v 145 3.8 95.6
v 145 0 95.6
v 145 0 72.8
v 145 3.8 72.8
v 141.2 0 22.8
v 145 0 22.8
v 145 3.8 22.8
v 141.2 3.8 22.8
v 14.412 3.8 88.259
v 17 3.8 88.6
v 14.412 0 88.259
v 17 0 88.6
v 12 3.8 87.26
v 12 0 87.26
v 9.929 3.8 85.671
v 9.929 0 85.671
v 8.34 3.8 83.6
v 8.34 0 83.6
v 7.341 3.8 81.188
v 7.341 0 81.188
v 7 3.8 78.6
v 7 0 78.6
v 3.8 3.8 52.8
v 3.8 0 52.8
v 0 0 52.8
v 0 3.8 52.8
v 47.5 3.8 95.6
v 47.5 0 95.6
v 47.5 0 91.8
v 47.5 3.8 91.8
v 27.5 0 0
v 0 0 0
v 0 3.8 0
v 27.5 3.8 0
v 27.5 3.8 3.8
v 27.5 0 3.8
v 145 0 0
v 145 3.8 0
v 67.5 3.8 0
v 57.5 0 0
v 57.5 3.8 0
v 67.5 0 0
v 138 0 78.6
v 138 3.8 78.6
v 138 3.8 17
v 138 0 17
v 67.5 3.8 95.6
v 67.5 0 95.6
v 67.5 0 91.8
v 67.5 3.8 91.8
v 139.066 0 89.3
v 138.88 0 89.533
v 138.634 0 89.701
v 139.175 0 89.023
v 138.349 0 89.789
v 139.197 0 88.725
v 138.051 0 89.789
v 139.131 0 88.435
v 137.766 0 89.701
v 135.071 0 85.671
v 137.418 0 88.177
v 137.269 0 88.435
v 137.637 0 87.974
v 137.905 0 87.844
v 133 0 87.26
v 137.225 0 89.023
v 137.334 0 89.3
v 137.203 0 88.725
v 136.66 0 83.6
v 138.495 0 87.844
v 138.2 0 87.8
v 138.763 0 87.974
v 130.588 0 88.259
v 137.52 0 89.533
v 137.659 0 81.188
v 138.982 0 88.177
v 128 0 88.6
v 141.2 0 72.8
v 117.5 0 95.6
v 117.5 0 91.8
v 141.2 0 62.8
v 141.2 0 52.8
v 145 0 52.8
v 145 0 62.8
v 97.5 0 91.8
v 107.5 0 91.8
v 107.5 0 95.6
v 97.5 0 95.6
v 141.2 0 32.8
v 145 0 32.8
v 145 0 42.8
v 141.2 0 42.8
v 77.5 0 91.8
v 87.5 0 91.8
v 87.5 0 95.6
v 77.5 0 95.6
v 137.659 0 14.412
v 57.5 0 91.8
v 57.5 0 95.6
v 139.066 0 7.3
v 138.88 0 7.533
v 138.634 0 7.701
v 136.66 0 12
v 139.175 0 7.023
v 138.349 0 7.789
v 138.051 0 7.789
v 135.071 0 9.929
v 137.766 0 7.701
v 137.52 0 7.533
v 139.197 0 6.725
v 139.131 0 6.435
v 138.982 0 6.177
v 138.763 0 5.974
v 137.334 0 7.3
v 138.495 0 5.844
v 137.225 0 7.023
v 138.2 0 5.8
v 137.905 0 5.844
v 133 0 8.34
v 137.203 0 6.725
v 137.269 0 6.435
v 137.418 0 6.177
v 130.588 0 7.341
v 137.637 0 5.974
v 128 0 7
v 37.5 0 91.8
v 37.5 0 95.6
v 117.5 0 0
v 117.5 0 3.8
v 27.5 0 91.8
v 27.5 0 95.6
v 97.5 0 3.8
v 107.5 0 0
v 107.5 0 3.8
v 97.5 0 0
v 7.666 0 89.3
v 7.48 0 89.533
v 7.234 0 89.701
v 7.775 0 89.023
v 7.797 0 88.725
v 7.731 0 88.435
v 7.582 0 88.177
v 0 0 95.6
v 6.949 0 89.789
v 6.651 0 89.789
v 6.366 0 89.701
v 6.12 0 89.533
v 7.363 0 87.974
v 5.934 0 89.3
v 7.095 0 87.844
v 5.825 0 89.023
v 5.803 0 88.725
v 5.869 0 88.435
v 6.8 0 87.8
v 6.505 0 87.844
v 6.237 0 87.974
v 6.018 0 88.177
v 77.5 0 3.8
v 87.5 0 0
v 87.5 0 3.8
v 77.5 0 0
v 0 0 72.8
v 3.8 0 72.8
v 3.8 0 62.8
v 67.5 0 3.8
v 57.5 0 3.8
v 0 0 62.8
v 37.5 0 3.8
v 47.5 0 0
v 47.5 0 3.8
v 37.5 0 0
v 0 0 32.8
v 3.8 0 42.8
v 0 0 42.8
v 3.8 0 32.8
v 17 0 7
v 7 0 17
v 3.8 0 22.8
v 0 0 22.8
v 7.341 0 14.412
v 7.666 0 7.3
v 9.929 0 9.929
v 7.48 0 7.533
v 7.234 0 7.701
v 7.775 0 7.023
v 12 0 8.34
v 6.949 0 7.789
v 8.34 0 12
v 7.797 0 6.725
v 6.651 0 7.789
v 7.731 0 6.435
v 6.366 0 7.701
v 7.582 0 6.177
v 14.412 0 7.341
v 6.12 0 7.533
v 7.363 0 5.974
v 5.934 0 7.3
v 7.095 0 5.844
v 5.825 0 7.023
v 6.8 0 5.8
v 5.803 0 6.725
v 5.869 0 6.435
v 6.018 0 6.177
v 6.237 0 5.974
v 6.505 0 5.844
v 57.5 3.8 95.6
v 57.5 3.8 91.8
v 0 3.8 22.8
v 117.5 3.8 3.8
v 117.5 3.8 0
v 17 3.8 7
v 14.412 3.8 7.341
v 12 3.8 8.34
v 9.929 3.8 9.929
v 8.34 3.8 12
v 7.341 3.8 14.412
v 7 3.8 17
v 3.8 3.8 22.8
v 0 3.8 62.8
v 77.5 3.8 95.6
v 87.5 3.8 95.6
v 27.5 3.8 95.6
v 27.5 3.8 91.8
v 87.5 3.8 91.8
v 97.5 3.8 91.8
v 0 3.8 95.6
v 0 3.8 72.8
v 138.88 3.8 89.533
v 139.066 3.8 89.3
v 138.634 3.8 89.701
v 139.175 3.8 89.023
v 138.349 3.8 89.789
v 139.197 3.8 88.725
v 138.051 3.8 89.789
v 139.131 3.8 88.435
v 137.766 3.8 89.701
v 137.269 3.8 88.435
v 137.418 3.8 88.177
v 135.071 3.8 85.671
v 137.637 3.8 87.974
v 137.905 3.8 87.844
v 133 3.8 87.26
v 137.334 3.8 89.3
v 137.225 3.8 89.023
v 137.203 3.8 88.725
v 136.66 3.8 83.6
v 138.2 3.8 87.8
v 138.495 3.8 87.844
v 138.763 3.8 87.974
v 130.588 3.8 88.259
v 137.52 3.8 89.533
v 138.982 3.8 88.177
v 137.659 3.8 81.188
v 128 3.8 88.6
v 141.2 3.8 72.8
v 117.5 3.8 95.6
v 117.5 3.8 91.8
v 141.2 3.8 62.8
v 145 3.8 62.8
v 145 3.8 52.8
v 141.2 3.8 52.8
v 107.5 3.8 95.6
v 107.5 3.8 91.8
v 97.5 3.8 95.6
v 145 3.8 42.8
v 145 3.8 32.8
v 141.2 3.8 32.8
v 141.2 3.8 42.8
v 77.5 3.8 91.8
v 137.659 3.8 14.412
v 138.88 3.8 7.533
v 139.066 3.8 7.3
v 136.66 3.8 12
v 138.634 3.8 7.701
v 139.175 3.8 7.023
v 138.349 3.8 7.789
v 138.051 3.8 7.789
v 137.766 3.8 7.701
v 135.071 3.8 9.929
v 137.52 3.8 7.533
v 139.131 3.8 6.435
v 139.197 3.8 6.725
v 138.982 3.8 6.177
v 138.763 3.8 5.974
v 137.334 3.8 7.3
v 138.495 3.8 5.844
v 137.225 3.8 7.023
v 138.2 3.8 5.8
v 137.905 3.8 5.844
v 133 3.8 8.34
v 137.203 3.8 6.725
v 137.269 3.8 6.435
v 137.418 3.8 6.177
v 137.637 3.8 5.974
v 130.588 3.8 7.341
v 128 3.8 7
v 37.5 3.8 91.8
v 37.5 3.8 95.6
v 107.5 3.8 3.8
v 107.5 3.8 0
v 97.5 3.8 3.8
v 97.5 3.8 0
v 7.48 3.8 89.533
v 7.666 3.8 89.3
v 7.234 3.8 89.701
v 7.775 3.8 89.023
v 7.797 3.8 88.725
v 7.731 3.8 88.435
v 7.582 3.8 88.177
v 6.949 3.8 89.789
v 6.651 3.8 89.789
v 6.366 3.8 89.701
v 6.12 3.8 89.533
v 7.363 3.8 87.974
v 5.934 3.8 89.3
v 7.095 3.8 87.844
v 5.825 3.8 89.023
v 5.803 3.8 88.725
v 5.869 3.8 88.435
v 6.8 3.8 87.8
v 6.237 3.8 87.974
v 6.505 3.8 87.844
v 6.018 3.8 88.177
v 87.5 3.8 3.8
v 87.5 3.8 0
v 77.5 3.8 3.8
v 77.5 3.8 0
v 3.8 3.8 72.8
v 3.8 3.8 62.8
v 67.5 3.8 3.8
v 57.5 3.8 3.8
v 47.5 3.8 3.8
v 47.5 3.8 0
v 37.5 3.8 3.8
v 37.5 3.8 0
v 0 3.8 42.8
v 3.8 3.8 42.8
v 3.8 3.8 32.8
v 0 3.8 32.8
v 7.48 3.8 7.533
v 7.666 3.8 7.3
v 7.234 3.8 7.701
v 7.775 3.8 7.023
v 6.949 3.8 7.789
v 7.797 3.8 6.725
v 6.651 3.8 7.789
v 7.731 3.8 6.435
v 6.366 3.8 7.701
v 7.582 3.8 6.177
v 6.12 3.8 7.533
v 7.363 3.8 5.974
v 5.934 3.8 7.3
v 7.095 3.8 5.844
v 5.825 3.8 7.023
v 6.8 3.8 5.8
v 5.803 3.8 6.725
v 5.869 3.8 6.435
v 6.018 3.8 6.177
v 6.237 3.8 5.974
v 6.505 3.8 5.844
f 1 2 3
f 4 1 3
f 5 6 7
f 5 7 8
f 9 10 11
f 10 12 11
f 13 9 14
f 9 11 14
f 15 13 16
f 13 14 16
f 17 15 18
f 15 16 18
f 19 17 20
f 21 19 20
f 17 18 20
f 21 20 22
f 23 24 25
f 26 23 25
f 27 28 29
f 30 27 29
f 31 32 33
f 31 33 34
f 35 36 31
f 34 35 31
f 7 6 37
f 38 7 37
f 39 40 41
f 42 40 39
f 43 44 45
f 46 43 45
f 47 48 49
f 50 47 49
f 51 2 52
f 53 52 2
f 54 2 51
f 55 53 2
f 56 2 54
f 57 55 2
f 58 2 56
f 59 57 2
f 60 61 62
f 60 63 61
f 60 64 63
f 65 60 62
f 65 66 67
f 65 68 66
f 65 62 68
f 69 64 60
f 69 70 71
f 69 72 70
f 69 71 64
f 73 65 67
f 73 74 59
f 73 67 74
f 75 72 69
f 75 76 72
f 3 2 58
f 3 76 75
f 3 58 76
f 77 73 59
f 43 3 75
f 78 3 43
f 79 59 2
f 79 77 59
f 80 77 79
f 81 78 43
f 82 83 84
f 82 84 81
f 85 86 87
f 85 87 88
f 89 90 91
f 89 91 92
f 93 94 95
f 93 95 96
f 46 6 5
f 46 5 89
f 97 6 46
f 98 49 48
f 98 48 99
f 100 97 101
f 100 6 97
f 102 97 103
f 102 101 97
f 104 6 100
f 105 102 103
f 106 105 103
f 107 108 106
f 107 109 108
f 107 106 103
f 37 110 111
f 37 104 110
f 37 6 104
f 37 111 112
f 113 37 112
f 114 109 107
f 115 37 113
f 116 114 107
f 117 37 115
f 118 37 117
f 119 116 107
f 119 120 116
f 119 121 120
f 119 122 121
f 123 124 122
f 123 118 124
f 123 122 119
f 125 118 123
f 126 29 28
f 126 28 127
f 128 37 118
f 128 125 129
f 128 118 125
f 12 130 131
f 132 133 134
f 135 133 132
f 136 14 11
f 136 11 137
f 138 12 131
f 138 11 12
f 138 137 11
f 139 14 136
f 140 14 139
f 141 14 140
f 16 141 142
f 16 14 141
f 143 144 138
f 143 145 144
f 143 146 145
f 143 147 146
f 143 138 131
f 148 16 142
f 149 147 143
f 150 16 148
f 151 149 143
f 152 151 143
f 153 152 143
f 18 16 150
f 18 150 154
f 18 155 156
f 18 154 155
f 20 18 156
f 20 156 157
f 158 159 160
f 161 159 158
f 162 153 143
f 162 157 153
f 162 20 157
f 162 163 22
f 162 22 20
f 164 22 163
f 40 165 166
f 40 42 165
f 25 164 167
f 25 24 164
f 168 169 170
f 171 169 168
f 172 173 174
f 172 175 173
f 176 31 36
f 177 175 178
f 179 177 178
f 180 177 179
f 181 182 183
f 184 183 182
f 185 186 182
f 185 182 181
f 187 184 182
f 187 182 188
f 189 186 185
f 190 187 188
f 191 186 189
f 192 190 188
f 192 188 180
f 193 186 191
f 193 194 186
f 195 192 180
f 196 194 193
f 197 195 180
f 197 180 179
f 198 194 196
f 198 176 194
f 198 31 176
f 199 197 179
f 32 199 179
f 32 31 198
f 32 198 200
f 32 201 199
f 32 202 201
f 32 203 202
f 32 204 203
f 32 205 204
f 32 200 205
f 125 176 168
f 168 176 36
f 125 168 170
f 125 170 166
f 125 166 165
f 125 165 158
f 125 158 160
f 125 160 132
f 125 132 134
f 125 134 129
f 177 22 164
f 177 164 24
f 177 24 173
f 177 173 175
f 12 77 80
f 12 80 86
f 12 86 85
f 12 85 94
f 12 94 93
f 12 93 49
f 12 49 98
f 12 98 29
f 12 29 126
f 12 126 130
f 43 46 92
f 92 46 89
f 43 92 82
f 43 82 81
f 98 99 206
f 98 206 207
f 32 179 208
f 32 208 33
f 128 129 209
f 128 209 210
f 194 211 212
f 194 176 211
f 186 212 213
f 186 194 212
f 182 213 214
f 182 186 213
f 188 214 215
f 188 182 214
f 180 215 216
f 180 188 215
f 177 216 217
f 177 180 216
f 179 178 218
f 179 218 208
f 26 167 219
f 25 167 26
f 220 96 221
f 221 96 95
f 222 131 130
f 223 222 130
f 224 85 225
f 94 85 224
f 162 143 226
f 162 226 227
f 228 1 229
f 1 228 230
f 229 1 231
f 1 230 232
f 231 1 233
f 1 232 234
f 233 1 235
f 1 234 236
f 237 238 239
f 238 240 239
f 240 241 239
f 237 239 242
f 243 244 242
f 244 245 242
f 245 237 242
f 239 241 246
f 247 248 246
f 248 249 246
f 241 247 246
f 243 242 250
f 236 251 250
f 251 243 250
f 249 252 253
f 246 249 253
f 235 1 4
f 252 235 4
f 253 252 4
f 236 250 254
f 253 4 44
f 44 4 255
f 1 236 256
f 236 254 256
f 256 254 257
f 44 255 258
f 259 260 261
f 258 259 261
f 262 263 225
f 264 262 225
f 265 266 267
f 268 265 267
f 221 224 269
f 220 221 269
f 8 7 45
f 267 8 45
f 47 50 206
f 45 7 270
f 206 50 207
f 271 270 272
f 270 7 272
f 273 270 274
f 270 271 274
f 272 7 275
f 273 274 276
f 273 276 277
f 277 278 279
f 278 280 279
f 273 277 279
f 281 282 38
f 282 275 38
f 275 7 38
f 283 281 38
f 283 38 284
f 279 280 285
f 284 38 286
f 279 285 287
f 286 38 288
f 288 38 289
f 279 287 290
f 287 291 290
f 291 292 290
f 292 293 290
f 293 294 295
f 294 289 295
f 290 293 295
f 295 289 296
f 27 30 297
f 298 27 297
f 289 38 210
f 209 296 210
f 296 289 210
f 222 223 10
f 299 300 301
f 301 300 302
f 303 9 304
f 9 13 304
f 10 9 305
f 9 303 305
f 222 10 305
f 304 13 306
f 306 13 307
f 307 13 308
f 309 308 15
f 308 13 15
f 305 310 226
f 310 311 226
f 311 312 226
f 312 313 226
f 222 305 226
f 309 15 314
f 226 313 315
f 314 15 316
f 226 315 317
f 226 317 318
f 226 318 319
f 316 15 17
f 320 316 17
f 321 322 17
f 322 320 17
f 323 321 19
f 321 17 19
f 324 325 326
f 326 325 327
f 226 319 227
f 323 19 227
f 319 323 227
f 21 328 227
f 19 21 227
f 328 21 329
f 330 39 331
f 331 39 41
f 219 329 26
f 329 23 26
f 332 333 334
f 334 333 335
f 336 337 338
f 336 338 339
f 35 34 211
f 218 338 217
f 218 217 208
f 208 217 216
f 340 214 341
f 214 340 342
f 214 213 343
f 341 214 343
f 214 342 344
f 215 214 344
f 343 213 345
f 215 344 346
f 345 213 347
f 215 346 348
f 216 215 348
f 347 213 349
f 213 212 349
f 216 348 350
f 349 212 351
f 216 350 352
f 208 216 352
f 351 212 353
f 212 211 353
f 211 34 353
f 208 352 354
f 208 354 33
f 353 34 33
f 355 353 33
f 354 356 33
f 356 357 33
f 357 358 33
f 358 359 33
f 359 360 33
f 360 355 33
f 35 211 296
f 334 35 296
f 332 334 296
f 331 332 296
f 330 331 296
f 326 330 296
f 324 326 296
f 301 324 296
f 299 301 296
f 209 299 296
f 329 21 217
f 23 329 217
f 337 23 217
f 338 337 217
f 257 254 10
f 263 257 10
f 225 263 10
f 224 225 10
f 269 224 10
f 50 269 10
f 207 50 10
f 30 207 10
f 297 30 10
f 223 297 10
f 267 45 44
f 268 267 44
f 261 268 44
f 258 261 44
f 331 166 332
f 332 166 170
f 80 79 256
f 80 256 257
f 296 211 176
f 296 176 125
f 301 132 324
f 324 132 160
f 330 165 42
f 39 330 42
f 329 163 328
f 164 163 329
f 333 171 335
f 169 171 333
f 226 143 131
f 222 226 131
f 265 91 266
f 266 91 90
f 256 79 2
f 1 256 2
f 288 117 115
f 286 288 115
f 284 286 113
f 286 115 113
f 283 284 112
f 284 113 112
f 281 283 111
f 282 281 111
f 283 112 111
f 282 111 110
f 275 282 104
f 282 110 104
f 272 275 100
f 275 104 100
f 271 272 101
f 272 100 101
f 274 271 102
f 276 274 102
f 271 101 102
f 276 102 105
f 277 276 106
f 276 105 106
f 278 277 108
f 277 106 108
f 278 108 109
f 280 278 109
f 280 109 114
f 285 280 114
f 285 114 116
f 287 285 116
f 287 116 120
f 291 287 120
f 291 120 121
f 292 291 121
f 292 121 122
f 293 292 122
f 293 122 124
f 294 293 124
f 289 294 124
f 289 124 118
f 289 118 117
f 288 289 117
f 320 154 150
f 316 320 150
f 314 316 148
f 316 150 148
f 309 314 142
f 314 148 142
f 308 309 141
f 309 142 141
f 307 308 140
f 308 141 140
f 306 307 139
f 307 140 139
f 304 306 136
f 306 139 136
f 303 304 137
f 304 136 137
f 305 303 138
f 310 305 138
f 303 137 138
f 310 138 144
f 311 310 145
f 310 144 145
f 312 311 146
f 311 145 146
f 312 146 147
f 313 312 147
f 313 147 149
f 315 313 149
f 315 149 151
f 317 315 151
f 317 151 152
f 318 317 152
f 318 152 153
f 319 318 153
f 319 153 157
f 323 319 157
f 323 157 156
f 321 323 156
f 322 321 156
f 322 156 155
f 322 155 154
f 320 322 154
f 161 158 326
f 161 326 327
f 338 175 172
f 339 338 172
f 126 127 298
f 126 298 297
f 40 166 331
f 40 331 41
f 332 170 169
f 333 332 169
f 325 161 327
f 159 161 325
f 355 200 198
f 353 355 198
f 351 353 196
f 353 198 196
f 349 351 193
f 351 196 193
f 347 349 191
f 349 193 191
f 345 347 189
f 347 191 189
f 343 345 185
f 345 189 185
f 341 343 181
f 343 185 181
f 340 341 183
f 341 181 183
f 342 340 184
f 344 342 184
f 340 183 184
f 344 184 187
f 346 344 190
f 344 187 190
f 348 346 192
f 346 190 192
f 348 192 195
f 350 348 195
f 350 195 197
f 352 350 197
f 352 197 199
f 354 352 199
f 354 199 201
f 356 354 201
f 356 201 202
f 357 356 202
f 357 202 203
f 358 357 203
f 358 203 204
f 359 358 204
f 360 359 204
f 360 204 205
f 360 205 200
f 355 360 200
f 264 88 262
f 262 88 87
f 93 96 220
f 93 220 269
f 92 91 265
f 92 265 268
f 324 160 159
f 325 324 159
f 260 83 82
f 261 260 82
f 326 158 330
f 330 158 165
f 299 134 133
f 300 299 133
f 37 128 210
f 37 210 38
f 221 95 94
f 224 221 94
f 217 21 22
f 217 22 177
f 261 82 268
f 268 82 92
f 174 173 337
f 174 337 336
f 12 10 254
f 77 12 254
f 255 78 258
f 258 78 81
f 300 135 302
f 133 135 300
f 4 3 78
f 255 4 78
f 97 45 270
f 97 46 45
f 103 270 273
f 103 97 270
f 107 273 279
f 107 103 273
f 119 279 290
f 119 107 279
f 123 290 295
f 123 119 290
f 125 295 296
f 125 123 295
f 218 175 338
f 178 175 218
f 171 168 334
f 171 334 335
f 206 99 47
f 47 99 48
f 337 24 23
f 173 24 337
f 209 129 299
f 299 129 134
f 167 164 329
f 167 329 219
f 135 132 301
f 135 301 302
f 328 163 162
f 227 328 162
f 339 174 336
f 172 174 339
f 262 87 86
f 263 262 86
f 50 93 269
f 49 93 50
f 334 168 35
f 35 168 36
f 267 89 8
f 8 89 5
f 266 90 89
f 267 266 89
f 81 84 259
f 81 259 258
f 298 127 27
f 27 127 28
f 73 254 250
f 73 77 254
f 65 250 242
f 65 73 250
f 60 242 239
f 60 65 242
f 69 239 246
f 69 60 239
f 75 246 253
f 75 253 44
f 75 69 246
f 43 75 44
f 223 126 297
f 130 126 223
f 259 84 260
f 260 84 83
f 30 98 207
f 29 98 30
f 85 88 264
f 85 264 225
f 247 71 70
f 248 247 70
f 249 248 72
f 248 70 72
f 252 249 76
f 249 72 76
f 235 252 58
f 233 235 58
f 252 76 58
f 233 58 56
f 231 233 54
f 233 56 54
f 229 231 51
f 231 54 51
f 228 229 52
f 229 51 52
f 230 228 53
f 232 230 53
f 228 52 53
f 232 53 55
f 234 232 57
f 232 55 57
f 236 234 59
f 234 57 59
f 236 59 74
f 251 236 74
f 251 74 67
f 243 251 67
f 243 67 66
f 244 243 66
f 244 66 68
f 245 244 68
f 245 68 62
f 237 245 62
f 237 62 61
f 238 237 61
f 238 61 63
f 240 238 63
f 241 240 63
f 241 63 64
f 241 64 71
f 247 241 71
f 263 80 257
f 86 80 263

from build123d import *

# Parameters (mm, degrees)
SKETCH1_W           = 145
SKETCH1_H           = 95.6
BOSS_EXTRUDE1_DEPTH = 3.8
SKETCH2_W           = 131
SKETCH2_H           = 81.6
CUT_EXTRUDE1_DEPTH  = 174.720465116
FILLET1_R           = 10
SKETCH3_R           = 1
CUT_EXTRUDE2_DEPTH  = 174.720465116
SKETCH8_W           = 10
SKETCH8_H           = 3.8
CUT_EXTRUDE5_DEPTH  = 174.720465116
LPATTERN3_COUNT     = 4
LPATTERN3_PITCH     = 20
LPATTERN3_COL_COUNT = 4
LPATTERN3_COL_PITCH = 20
SKETCH9_W           = 3.8
SKETCH9_H           = 10
CUT_EXTRUDE6_DEPTH  = 174.720465116
LPATTERN4_COUNT     = 3
LPATTERN4_PITCH     = 20
LPATTERN4_COL_COUNT = 3
LPATTERN4_COL_PITCH = 20
SKETCH11_W          = 3.8
SKETCH11_H          = 10
SKETCH11_W_2        = 10
SKETCH11_H_2        = 3.8
BOSS_EXTRUDE4_DEPTH = 3.8


with BuildPart() as part:
    # Sketch1 → Boss-Extrude1 (new body)
    with BuildSketch(Plane(origin=(0, 0, 0), x_dir=(1, 0, 0), z_dir=(0, 1, 0))):
        with Locations((72.5, -47.8)):
            Rectangle(SKETCH1_W, SKETCH1_H)
    extrude(amount=BOSS_EXTRUDE1_DEPTH)

    # Sketch2 → Cut-Extrude1 (cut, through all)
    with BuildSketch(Plane(origin=(0, 3.8, 0), x_dir=(1, 0, 0), z_dir=(0, 1, 0))):
        with Locations((72.5, -47.8)):
            Rectangle(SKETCH2_W, SKETCH2_H)
    extrude(amount=-CUT_EXTRUDE1_DEPTH, mode=Mode.SUBTRACT)

    # Fillet1
    fillet1_edges = [part.edges().sort_by_distance(p)[0] for p in [
        (7, 1.9, 88.6),
        (7, 1.9, 7),
        (138, 1.9, 7),
        (138, 1.9, 88.6),
    ]]
    fillet(fillet1_edges, radius=FILLET1_R)

    # Sketch3 → Cut-Extrude2 (cut, through all)
    with BuildSketch(Plane.XZ):
        with Locations(Location((6.8, 88.8, 0), (0, 0, 270))):
            Circle(SKETCH3_R)
        with Locations(Location((138.2, 88.8, 0), (0, 0, 270))):
            Circle(SKETCH3_R)
        with Locations(Location((138.2, 6.8, 0), (0, 0, 270))):
            Circle(SKETCH3_R)
        with Locations(Location((6.8, 6.8, 0), (0, 0, 270))):
            Circle(SKETCH3_R)
    extrude(amount=-CUT_EXTRUDE2_DEPTH, mode=Mode.SUBTRACT)

    # Sketch8 → Cut-Extrude5 (cut, through all)
    with BuildSketch(Plane(origin=(0, 0, 0), x_dir=(-1, 0, 0), z_dir=(0, -1, 0))):
        with Locations((-72.5, -93.7)):
            Rectangle(SKETCH8_W, SKETCH8_H)
        with Locations((-72.5, -1.9)):
            Rectangle(SKETCH8_W, SKETCH8_H)
    cut_extrude5 = extrude(amount=-CUT_EXTRUDE5_DEPTH, mode=Mode.SUBTRACT)

    # LPattern3: Cut-Extrude5 ×4
    with Locations(*[(i * LPATTERN3_PITCH, 0, 0) for i in range(1, LPATTERN3_COUNT)]):
        add(cut_extrude5, mode=Mode.SUBTRACT)

    # LPattern3 col: Cut-Extrude5 ×4
    with Locations(*[(-i * LPATTERN3_COL_PITCH, 0, 0) for i in range(1, LPATTERN3_COL_COUNT)]):
        add(cut_extrude5, mode=Mode.SUBTRACT)

    # Sketch9 → Cut-Extrude6 (cut, through all)
    with BuildSketch(Plane(origin=(0, 0, 0), x_dir=(-1, 0, 0), z_dir=(0, -1, 0))):
        with Locations((-1.9, -47.8)):
            Rectangle(SKETCH9_W, SKETCH9_H)
        with Locations((-143.1, -47.8)):
            Rectangle(SKETCH9_W, SKETCH9_H)
    cut_extrude6 = extrude(amount=-CUT_EXTRUDE6_DEPTH, mode=Mode.SUBTRACT)

    # LPattern4: Cut-Extrude6 ×3
    with Locations(*[(0, 0, i * LPATTERN4_PITCH) for i in range(1, LPATTERN4_COUNT)]):
        add(cut_extrude6, mode=Mode.SUBTRACT)

    # LPattern4 col: Cut-Extrude6 ×3
    with Locations(*[(0, 0, -i * LPATTERN4_COL_PITCH) for i in range(1, LPATTERN4_COL_COUNT)]):
        add(cut_extrude6, mode=Mode.SUBTRACT)

    # Sketch11 → Boss-Extrude4 (add, through all)
    with BuildSketch(Plane(origin=(0, 0, 0), x_dir=(-1, 0, 0), z_dir=(0, -1, 0))):
        with Locations((-143.1, -87.8)):
            Rectangle(SKETCH11_W, SKETCH11_H)
        with Locations((-132.5, -93.7)):
            Rectangle(SKETCH11_W_2, SKETCH11_H_2)
        with Locations((-132.5, -1.9)):
            Rectangle(SKETCH11_W_2, SKETCH11_H_2)
        with Locations((-143.1, -7.8)):
            Rectangle(SKETCH11_W, SKETCH11_H)
        with Locations((-1.9, -7.8)):
            Rectangle(SKETCH11_W, SKETCH11_H)
        with Locations((-12.5, -1.9)):
            Rectangle(SKETCH11_W_2, SKETCH11_H_2)
        with Locations((-1.9, -87.8)):
            Rectangle(SKETCH11_W, SKETCH11_H)
        with Locations((-12.5, -93.7)):
            Rectangle(SKETCH11_W_2, SKETCH11_H_2)
    extrude(amount=-BOSS_EXTRUDE4_DEPTH)


solid = part.part
